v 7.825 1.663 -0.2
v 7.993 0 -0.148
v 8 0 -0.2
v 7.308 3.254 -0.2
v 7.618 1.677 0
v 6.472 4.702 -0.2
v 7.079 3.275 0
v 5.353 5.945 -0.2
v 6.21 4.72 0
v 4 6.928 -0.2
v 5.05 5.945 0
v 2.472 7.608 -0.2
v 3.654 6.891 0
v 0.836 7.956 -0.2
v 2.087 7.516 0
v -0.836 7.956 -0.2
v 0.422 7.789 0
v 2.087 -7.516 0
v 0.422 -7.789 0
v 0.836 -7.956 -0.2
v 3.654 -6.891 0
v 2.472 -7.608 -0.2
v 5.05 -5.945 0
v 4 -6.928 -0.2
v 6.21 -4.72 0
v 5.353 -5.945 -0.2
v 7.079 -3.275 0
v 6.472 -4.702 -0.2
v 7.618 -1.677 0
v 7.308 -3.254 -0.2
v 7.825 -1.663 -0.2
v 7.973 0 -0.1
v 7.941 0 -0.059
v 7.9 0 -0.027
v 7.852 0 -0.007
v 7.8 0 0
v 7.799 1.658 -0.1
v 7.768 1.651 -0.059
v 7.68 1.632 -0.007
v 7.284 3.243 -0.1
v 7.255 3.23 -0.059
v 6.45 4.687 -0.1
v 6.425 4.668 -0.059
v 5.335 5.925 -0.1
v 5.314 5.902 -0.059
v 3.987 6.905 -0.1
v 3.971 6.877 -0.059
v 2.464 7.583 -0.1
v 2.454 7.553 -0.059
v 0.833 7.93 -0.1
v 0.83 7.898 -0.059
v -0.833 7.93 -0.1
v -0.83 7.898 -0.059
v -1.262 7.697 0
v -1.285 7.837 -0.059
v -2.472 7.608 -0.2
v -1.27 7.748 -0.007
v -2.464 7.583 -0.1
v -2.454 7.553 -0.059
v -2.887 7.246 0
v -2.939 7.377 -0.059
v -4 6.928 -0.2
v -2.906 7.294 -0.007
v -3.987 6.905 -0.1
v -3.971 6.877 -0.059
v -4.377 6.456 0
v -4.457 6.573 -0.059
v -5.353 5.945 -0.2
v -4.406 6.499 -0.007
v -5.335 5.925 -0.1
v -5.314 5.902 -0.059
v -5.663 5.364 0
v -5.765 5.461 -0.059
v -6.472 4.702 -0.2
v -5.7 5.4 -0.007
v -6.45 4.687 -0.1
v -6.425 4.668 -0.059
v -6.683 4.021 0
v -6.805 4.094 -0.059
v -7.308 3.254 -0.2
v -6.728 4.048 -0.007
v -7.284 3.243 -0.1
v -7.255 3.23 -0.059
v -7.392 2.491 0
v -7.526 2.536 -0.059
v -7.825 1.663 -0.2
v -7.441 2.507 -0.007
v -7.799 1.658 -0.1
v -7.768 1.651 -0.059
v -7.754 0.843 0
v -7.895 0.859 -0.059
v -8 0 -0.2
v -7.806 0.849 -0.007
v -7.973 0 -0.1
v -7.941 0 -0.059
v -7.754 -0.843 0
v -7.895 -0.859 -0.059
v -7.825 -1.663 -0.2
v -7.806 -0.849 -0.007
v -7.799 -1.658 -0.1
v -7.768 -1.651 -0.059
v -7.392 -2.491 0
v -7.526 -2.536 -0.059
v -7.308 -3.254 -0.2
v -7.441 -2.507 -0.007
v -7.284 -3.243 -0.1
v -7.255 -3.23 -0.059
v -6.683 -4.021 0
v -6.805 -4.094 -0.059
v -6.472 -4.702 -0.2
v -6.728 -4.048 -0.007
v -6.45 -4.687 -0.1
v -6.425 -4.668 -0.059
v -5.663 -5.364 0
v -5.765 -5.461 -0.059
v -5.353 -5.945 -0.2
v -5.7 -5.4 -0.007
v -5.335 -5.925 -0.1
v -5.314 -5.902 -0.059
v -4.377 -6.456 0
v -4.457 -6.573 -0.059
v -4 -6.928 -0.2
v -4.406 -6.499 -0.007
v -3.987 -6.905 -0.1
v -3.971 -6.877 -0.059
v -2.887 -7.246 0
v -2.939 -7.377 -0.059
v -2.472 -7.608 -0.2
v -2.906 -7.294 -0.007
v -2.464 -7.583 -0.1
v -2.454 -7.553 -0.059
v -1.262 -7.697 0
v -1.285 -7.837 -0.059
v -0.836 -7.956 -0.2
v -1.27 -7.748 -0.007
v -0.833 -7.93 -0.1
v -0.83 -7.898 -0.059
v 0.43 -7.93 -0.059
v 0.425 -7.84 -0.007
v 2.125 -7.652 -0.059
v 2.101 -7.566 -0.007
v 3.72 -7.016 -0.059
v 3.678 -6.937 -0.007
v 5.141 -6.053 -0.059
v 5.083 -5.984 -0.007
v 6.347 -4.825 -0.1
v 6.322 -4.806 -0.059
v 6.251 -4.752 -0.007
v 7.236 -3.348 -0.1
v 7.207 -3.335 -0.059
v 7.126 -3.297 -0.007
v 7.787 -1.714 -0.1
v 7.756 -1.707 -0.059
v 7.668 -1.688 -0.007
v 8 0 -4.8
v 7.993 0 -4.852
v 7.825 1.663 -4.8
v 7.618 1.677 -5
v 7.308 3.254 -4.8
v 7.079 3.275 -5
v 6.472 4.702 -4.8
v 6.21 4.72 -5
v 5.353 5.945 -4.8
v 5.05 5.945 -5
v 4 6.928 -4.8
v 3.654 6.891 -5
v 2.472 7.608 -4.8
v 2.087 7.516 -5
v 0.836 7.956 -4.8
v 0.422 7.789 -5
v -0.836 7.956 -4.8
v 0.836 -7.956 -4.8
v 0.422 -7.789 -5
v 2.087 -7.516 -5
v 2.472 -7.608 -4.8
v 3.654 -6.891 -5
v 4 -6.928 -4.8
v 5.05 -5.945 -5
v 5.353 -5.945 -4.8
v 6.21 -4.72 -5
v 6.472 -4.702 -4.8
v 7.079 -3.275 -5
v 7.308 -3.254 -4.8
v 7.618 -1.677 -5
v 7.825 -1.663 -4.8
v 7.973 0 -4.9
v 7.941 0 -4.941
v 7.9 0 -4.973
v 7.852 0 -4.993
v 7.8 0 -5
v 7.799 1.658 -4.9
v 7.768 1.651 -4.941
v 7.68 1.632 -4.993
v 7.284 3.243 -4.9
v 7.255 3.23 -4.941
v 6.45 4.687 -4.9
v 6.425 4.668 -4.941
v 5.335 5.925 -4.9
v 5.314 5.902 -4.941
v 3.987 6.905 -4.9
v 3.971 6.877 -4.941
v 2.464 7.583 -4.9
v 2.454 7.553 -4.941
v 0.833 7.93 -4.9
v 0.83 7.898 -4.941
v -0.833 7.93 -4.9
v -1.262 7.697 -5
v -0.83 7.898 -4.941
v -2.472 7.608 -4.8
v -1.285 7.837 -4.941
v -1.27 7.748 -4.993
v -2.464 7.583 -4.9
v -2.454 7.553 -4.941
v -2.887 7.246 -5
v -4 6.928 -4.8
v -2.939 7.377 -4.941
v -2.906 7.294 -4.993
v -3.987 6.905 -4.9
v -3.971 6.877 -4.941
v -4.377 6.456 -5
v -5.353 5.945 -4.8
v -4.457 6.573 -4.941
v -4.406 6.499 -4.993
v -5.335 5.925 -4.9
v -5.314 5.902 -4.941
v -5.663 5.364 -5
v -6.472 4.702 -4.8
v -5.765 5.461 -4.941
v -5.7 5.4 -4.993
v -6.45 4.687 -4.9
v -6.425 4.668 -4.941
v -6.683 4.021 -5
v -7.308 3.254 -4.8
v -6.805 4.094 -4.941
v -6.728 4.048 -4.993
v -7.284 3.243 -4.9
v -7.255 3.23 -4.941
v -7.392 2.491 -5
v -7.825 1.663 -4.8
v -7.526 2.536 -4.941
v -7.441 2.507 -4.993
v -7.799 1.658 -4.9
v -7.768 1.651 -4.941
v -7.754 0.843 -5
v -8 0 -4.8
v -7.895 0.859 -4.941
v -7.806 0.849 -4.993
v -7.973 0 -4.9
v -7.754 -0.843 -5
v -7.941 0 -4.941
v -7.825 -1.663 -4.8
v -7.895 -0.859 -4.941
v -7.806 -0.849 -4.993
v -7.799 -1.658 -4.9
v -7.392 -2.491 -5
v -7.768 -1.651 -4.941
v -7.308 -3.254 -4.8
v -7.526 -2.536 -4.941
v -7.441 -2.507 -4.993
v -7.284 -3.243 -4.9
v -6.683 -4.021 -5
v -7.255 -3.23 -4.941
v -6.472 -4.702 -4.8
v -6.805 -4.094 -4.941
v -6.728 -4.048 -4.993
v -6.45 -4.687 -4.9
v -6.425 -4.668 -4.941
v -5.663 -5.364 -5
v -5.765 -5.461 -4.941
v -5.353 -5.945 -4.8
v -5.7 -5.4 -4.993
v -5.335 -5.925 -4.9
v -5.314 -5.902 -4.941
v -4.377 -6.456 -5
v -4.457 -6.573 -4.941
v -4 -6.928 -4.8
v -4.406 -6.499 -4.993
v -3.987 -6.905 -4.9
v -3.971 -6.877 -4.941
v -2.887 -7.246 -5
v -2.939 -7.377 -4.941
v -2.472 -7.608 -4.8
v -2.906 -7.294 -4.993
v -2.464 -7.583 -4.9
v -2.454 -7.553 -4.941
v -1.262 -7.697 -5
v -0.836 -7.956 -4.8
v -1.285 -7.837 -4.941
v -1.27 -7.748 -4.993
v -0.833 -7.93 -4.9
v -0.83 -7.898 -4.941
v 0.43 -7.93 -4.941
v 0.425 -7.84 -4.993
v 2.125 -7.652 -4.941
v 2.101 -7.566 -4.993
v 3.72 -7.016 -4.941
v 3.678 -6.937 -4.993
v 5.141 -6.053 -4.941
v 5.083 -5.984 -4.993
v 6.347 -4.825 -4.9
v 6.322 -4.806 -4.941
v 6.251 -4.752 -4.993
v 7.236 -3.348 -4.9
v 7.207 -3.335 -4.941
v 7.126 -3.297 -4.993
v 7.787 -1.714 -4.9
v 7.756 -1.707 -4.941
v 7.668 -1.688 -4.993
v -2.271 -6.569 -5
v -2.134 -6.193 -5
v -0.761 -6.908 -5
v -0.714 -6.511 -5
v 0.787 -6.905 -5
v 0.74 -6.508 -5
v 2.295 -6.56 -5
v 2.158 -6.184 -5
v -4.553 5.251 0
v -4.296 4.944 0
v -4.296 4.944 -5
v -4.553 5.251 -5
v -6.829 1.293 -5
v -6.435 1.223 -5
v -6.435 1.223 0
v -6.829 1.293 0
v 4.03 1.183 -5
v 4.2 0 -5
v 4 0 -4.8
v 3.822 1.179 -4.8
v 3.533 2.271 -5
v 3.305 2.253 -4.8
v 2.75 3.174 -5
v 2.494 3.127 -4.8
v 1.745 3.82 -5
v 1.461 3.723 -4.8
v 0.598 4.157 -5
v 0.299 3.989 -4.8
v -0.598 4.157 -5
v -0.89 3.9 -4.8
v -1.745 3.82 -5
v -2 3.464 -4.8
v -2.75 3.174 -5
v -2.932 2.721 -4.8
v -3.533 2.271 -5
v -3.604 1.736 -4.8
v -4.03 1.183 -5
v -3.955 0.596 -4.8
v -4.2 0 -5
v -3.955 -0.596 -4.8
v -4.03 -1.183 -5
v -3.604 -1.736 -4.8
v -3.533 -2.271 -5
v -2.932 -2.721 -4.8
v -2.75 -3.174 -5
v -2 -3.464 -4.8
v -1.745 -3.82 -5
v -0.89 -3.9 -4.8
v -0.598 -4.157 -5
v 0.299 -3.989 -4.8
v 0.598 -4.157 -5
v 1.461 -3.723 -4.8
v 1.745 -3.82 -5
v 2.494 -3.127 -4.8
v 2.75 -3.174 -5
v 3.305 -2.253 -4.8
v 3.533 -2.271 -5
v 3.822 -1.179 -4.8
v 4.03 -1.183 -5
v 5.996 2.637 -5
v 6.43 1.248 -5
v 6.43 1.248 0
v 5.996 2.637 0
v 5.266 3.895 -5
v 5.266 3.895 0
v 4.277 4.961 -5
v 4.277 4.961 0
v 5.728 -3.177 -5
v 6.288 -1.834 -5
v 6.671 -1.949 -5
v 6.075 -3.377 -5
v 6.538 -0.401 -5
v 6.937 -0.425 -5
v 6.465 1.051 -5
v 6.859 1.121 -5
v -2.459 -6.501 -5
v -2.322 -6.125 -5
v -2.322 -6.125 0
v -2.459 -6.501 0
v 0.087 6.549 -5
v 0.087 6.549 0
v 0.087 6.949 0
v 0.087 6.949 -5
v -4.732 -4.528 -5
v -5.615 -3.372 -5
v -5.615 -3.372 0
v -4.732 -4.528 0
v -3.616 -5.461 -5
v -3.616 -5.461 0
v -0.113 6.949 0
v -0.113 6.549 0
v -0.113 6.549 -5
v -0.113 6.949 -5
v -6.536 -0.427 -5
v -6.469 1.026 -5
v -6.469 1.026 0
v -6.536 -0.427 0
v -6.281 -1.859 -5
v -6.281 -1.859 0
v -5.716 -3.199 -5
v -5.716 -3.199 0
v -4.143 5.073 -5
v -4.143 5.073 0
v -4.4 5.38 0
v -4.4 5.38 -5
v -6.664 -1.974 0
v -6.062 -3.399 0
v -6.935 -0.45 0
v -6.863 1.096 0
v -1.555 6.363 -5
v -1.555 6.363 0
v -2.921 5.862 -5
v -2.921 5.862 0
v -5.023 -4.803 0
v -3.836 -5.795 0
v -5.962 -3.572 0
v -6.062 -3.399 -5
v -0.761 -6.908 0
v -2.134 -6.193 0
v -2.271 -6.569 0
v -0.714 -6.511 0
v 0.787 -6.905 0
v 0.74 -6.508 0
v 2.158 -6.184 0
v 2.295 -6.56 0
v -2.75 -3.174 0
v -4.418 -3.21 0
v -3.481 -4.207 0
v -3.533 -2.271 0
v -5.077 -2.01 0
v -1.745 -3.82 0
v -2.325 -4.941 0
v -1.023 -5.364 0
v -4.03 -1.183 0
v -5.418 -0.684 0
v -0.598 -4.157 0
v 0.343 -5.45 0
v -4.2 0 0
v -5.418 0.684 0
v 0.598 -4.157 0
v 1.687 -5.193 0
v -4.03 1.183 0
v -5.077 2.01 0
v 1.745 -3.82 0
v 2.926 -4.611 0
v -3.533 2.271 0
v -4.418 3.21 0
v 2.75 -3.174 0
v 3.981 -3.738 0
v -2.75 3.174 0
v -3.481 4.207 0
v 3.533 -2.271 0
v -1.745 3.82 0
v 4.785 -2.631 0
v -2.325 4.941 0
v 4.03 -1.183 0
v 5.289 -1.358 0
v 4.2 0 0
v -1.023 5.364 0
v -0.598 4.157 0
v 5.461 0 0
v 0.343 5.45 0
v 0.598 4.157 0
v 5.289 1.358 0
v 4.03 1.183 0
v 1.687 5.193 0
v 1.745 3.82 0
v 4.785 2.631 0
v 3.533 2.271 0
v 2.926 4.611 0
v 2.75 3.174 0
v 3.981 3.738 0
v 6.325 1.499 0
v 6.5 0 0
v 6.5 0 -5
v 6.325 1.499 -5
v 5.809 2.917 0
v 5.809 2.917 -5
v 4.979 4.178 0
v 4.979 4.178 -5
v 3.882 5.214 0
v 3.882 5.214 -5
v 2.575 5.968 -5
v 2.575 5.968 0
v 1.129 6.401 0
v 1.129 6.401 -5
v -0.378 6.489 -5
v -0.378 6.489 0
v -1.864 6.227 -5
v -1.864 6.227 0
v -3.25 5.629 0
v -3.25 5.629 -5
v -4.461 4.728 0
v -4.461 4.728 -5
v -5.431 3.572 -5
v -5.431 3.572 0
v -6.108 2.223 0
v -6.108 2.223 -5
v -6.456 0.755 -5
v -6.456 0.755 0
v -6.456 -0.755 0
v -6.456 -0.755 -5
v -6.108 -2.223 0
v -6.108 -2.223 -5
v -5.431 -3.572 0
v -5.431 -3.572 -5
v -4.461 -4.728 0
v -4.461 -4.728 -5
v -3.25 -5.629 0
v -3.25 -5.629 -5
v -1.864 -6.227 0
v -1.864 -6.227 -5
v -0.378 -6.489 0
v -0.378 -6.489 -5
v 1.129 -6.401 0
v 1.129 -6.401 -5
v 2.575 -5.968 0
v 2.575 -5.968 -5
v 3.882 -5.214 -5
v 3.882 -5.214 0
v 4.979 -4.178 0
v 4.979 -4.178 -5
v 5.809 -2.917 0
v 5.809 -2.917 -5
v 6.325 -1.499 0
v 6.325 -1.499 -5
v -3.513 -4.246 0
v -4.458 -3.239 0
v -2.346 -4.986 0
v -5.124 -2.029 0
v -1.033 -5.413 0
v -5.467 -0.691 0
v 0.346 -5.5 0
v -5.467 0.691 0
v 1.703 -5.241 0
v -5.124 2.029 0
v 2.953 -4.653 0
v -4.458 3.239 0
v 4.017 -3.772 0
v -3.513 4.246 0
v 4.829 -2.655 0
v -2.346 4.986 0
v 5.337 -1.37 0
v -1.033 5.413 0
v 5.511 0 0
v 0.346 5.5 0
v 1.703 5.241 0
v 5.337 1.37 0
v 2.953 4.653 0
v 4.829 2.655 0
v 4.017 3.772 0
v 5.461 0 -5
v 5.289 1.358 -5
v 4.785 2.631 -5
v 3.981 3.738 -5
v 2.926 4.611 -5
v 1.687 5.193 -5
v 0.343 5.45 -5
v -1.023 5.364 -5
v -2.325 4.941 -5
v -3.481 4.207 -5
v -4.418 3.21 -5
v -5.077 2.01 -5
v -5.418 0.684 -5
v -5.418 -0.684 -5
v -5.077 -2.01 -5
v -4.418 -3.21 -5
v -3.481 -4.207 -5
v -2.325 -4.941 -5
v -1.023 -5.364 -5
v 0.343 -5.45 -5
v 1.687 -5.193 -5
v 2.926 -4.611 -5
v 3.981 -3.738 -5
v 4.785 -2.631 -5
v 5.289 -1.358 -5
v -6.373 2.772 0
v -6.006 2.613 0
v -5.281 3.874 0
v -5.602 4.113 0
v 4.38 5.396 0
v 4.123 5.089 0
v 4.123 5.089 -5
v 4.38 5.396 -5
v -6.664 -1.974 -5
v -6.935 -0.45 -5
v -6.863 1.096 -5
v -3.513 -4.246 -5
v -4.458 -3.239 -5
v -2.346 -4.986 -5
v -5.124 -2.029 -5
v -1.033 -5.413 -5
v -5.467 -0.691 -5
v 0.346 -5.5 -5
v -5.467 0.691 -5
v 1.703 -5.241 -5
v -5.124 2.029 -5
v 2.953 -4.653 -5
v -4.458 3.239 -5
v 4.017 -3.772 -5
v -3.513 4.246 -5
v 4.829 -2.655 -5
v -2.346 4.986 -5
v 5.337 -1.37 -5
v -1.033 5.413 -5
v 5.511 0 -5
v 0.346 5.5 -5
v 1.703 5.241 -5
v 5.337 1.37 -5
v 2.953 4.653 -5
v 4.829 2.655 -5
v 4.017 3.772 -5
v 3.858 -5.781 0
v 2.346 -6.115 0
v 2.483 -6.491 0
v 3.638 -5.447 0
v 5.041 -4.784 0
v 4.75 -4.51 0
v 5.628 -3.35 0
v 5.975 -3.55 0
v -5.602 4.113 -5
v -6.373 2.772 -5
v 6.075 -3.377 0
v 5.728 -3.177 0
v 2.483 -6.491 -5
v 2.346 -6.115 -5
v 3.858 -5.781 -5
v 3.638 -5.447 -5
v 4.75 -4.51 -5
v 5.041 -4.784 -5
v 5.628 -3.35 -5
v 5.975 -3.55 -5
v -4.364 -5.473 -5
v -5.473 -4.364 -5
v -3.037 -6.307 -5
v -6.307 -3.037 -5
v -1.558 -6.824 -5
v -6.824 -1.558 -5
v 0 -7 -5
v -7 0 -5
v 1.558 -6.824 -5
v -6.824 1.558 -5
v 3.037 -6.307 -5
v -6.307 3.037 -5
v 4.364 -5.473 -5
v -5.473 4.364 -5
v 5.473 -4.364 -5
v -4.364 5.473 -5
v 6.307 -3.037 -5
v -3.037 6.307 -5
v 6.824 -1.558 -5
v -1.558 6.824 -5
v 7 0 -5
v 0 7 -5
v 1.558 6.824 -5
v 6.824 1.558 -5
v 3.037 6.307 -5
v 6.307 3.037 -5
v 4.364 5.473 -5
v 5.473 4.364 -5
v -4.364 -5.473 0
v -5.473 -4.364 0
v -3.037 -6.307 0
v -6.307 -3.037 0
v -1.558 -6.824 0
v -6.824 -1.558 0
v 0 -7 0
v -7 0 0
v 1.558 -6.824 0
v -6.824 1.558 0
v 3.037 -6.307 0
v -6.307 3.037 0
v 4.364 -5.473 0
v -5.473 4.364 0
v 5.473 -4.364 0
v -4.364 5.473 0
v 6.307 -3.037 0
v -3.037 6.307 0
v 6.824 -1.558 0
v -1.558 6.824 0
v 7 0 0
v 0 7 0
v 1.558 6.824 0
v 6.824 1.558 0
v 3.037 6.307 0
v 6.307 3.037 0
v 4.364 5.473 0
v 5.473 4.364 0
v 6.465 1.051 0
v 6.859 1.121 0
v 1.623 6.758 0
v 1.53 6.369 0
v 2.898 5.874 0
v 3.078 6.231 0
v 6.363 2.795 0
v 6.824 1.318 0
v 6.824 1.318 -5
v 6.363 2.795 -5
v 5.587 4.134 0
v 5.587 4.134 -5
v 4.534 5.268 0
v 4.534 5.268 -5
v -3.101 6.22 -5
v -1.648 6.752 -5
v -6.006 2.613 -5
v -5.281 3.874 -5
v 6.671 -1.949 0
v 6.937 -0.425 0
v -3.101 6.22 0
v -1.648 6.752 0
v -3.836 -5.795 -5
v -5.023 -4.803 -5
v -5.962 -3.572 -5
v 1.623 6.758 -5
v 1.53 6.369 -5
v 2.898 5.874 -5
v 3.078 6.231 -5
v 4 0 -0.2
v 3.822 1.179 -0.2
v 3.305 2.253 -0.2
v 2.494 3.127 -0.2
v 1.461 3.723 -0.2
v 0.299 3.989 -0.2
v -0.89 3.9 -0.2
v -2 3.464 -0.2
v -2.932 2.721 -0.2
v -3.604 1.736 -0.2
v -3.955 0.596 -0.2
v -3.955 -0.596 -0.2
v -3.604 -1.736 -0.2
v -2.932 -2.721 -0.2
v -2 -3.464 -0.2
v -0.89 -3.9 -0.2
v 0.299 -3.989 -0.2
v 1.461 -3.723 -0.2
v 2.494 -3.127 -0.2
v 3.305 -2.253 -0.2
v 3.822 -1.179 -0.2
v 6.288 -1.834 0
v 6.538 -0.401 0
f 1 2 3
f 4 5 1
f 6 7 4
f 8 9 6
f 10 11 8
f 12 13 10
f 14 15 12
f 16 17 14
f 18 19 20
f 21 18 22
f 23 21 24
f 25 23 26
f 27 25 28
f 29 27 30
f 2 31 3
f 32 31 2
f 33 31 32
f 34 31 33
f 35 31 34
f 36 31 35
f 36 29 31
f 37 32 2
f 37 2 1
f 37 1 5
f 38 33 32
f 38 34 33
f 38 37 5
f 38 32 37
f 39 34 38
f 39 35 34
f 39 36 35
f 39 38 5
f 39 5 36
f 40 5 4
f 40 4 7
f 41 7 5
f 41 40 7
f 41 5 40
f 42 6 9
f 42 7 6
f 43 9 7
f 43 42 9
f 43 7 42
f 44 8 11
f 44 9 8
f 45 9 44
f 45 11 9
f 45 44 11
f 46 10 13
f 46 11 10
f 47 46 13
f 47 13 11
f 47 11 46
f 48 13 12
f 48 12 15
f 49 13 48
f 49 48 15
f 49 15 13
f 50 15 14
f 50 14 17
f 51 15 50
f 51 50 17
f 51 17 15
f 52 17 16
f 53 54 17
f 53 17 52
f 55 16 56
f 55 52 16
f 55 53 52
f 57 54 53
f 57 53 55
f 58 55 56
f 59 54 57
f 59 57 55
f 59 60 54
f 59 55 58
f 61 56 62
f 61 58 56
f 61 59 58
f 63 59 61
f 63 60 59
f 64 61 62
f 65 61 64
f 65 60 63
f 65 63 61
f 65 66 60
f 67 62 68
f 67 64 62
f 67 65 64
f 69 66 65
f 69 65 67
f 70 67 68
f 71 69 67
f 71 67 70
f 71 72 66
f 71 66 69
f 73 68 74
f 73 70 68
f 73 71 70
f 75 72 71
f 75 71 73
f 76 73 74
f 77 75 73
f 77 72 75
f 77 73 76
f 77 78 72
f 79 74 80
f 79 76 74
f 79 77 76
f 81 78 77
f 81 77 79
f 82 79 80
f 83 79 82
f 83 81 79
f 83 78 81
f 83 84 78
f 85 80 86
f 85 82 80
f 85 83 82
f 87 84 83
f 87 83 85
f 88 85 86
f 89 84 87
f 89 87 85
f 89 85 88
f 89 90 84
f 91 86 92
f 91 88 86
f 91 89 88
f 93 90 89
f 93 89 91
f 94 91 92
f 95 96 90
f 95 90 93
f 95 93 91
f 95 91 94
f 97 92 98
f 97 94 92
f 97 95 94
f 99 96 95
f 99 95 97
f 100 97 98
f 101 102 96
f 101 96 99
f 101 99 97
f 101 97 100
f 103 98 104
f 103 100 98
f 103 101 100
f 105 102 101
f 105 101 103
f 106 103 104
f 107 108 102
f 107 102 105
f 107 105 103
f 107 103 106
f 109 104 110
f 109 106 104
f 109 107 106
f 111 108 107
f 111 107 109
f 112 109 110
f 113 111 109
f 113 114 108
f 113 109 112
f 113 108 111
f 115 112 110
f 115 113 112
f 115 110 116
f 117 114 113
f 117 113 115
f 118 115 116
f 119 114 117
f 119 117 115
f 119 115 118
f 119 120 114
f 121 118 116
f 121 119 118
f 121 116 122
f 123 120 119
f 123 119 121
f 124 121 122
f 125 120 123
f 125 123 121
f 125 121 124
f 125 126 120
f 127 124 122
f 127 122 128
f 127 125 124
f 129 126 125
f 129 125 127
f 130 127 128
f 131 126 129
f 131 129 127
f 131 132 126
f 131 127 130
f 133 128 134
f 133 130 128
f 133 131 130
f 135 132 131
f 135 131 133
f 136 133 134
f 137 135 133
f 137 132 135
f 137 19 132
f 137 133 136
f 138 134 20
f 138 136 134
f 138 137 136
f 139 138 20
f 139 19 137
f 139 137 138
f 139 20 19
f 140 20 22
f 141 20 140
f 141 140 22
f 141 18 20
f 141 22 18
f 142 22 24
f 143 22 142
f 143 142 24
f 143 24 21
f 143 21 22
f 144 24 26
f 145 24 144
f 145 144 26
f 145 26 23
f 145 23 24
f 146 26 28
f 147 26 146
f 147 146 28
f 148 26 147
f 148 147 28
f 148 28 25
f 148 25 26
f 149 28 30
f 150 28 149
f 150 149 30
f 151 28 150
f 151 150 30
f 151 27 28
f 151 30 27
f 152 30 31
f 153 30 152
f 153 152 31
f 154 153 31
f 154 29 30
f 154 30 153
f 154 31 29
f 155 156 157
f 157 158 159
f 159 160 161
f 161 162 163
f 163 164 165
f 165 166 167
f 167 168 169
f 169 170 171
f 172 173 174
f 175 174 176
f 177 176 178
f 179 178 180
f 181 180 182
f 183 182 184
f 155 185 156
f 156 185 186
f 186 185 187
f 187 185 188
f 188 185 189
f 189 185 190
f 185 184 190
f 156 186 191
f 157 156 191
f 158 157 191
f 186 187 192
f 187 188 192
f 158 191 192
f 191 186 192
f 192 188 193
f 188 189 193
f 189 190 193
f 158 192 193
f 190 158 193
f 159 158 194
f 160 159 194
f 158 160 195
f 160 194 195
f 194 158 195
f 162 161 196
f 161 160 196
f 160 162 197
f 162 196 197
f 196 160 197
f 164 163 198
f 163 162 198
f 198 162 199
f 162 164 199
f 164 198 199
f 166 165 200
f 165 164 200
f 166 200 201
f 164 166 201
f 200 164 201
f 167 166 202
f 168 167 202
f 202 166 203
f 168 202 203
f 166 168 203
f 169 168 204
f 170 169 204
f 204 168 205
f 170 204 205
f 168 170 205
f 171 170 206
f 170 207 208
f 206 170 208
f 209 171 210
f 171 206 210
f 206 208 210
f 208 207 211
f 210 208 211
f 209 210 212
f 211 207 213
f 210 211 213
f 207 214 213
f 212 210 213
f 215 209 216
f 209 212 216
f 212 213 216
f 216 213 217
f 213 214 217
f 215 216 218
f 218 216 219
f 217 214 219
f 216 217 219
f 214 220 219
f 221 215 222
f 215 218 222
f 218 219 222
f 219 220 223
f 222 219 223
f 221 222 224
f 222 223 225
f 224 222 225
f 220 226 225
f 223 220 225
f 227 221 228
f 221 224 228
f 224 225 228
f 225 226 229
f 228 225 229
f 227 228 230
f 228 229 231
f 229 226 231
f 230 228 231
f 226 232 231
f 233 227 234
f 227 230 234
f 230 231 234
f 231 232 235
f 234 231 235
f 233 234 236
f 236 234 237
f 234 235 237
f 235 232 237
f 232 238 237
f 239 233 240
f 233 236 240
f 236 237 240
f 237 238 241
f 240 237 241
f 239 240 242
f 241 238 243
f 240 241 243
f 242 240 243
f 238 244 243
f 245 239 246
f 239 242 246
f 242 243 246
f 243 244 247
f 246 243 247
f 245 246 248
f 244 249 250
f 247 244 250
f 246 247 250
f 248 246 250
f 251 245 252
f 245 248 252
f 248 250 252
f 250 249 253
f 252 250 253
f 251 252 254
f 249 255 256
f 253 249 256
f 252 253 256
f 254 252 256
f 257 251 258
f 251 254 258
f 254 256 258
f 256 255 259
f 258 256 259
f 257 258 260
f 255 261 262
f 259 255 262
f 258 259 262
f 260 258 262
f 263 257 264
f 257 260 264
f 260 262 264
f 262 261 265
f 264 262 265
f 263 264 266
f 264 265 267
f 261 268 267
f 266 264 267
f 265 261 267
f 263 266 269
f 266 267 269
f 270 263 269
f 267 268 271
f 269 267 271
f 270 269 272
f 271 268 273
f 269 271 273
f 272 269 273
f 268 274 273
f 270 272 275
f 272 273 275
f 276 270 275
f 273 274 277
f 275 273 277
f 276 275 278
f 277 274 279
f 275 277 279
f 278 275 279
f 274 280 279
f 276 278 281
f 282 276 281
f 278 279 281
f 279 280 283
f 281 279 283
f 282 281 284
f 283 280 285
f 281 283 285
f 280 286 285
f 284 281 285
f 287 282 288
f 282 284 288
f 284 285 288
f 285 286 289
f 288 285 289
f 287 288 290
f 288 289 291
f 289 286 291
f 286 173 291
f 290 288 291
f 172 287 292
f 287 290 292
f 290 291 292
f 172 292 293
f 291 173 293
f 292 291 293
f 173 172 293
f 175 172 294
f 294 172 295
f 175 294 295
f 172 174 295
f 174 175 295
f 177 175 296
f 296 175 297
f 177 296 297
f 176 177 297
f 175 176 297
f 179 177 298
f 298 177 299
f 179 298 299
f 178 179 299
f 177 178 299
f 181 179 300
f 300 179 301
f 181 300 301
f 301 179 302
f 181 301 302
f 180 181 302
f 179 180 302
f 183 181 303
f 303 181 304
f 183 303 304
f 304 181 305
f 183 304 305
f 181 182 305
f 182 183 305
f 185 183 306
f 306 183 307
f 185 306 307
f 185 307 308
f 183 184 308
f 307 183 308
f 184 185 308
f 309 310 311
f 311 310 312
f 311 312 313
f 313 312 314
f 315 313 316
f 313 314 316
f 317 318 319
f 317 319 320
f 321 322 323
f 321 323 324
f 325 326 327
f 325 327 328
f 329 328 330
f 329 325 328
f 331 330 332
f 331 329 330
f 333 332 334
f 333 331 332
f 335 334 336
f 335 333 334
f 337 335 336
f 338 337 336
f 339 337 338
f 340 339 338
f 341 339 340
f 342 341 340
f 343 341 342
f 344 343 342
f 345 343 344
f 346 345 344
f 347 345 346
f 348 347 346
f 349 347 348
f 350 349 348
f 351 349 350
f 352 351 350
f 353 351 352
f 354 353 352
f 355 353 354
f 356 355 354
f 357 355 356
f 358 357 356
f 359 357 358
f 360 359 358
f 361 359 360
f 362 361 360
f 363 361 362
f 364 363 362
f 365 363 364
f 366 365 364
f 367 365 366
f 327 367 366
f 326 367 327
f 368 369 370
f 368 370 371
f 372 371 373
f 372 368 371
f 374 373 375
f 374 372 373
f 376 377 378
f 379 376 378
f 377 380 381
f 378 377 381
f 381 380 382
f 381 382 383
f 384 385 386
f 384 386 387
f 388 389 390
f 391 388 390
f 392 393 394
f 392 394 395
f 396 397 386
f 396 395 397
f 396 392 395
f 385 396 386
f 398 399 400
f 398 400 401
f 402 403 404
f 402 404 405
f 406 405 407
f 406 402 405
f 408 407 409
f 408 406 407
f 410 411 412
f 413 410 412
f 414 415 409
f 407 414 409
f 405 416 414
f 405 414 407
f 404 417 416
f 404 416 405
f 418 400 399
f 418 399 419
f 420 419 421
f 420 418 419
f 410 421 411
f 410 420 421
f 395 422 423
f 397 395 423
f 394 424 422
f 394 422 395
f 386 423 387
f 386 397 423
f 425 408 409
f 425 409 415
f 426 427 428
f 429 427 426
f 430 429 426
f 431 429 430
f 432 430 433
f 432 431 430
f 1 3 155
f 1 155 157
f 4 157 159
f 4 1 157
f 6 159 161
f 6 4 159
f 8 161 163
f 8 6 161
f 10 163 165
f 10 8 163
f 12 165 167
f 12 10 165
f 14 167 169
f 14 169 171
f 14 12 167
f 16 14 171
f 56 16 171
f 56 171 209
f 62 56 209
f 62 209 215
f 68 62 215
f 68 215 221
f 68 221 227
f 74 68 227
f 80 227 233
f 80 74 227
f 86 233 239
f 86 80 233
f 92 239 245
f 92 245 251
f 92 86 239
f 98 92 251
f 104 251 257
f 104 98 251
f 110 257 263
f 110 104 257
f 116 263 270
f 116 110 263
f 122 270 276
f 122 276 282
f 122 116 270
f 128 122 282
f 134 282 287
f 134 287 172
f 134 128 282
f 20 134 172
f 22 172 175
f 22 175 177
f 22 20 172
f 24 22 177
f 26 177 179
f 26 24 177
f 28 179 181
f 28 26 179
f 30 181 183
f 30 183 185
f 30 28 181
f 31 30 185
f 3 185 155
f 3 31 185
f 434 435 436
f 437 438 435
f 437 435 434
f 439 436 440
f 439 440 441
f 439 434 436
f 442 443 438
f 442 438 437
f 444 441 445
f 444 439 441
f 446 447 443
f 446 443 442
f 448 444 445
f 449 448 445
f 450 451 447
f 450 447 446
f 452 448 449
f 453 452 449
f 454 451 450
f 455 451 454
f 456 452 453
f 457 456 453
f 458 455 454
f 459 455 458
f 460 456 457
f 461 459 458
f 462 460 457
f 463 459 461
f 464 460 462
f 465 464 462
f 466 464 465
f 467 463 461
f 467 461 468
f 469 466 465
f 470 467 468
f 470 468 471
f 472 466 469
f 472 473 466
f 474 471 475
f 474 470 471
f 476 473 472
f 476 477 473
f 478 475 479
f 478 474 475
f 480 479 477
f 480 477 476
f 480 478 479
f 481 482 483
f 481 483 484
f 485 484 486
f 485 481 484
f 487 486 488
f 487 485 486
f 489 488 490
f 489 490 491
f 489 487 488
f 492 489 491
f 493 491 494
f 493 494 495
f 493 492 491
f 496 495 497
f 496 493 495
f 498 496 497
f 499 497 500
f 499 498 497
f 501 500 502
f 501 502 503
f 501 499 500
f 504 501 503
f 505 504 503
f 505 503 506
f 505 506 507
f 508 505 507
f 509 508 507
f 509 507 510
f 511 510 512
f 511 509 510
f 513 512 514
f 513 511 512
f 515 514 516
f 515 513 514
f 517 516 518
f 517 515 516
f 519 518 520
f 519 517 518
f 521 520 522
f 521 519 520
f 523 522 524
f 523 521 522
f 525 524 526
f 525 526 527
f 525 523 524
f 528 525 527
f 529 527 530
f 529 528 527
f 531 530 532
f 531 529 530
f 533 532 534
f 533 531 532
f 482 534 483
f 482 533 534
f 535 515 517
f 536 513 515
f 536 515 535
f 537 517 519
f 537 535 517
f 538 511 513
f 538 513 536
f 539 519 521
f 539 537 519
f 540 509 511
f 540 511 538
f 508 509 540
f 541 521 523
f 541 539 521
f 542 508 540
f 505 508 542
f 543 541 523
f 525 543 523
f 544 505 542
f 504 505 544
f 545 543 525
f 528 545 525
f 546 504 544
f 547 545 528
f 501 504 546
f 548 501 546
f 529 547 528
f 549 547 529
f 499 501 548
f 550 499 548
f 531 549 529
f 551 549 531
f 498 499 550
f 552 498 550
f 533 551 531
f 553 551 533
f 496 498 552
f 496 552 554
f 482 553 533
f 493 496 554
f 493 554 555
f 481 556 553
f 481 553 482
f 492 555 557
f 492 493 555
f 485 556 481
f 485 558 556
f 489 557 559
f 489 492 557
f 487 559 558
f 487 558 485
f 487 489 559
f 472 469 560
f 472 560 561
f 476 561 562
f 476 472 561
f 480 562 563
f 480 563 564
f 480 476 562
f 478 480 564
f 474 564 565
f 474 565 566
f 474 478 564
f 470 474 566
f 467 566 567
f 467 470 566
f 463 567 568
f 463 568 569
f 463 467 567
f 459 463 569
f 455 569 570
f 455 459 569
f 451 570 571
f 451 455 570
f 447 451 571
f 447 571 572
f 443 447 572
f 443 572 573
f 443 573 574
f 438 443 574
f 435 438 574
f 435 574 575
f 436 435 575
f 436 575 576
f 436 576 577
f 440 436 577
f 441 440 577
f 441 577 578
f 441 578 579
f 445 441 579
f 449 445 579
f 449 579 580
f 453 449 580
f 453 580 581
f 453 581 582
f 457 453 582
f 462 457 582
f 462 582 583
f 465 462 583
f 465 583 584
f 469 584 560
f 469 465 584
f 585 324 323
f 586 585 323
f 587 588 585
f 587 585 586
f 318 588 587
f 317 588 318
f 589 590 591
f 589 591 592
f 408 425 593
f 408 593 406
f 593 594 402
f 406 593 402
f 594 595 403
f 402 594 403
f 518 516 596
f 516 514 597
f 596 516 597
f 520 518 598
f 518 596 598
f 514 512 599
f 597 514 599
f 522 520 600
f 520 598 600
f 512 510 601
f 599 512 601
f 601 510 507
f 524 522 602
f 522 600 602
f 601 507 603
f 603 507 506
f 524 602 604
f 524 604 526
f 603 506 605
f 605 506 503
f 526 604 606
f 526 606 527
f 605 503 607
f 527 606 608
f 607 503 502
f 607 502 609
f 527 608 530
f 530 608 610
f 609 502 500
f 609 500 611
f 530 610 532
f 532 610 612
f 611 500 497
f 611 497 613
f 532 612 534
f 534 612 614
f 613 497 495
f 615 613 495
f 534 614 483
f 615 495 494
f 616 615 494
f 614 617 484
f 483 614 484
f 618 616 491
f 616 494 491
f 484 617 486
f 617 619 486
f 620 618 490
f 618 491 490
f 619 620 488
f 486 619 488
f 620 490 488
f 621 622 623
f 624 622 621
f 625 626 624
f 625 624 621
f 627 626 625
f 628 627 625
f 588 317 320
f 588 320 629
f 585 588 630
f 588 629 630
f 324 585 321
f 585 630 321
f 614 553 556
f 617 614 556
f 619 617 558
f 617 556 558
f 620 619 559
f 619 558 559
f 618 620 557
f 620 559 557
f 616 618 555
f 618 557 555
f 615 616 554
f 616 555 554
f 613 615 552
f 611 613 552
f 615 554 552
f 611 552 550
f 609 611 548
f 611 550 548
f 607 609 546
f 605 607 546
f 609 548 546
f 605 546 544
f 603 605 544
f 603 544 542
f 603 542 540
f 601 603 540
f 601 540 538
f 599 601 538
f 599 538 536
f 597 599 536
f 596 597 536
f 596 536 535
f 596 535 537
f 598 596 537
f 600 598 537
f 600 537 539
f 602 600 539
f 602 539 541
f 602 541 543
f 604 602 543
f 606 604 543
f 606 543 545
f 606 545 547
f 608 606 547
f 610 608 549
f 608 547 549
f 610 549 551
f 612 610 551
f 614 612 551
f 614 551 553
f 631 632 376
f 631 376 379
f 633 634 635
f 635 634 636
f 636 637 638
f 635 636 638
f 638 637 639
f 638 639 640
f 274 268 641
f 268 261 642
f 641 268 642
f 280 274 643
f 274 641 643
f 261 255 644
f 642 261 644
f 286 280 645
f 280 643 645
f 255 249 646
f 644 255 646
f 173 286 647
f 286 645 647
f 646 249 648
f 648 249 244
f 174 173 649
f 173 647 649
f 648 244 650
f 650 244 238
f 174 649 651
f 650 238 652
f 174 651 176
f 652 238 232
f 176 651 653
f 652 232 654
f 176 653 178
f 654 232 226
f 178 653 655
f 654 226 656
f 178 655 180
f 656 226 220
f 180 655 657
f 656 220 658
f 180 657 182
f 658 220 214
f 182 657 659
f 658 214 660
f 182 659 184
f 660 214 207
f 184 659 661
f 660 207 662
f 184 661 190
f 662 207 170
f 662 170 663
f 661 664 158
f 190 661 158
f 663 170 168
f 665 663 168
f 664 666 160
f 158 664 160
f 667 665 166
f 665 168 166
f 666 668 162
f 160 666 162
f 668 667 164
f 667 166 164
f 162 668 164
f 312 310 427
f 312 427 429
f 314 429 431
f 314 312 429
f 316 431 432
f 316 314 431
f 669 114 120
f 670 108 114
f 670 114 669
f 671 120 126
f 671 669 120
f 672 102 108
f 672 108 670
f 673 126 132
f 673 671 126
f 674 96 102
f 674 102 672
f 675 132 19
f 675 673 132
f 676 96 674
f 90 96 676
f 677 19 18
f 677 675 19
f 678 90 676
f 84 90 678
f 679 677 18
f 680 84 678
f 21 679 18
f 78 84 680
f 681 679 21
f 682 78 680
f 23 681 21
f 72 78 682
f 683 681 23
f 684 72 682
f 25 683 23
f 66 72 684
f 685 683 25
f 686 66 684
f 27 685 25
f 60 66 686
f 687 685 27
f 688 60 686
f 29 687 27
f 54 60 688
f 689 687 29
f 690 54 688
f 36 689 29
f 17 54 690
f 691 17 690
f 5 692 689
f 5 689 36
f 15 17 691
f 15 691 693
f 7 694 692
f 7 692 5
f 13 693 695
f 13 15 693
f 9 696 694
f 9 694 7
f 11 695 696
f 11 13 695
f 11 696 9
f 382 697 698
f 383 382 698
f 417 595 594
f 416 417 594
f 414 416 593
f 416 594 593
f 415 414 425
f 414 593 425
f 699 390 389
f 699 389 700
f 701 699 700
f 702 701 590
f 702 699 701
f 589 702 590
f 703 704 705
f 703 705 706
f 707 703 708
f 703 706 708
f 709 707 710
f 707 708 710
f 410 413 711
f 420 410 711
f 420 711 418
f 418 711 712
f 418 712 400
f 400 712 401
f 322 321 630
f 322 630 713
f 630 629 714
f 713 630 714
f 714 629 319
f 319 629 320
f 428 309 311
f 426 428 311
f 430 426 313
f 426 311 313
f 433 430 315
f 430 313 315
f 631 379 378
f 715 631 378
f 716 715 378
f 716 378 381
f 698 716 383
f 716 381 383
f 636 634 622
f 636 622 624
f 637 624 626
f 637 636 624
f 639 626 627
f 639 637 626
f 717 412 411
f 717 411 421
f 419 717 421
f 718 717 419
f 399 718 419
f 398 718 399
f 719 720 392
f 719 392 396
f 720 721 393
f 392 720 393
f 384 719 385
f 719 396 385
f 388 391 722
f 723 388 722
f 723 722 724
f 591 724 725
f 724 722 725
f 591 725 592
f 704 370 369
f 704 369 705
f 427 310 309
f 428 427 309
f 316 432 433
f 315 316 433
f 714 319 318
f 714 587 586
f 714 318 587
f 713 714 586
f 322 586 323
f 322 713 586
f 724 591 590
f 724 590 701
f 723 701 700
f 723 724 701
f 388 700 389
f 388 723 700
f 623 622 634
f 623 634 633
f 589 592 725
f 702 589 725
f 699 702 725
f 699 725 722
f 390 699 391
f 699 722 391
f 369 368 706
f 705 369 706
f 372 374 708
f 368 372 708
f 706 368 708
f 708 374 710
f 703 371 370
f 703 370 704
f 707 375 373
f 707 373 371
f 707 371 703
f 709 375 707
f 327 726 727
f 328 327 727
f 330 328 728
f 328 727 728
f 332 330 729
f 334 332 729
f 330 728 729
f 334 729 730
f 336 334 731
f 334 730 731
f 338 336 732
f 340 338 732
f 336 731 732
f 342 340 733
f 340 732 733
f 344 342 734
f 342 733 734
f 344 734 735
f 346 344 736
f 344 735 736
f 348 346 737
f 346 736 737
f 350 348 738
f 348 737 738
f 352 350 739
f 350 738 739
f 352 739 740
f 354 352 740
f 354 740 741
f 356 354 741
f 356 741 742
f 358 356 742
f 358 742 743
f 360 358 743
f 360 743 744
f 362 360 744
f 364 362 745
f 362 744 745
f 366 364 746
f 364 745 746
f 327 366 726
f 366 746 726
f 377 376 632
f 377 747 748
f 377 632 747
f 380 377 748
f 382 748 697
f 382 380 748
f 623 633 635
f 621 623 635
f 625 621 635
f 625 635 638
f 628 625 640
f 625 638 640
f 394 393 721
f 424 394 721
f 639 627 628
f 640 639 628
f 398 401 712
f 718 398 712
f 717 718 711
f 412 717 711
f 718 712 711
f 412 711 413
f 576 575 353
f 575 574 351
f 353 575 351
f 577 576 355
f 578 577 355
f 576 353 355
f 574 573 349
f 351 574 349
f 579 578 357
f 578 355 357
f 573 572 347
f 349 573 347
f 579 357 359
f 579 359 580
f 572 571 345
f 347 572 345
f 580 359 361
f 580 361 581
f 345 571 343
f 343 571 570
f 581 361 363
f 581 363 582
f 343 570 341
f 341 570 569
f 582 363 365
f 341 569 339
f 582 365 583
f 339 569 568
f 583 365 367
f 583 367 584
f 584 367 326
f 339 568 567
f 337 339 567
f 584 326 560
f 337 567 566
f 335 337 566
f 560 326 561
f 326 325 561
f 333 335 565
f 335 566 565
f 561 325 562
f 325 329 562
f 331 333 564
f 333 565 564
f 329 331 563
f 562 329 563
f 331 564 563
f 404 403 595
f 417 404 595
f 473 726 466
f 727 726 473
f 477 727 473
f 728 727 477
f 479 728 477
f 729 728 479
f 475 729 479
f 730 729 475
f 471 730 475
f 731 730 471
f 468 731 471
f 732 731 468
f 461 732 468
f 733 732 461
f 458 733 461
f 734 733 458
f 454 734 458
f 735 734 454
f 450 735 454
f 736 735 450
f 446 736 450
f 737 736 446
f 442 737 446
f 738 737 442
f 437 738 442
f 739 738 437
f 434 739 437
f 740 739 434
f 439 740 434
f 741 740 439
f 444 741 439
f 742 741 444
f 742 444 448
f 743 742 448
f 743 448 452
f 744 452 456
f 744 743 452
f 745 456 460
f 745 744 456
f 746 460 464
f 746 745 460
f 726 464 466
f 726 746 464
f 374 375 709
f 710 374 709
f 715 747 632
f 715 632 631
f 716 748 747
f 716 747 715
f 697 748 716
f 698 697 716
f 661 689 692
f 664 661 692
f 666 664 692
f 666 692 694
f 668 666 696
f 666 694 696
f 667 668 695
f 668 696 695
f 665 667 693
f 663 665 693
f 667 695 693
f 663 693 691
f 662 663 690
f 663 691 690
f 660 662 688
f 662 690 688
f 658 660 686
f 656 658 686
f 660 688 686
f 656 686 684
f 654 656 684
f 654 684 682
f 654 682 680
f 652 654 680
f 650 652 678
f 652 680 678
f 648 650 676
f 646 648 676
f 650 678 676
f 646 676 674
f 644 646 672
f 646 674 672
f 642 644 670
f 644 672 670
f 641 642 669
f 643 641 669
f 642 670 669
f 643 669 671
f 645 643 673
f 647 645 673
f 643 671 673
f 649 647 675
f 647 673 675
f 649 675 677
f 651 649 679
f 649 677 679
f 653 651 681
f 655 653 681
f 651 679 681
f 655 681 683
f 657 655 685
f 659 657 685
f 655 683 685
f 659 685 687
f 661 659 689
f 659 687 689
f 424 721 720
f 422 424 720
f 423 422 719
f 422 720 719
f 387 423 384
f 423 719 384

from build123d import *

# Parameters (mm, degrees)
SKETCH1_R                = 8
BOSS_EXTRUDE1_DEPTH      = 5
SKETCH1_3_R              = 4
CUT_EXTRUDE1_DEPTH       = 5
SKETCH1_4_R              = 7
CUT_EXTRUDE2_DEPTH       = 5
SKETCH1_5_R              = 6.5
BOSS_EXTRUDE2_DEPTH      = 5
SKETCH1_6_R              = 4
CUT_EXTRUDE3_DEPTH       = 5
SKETCH3_R                = 7
SKETCH3_R_2              = 6.5
BOSS_EXTRUDE3_DEPTH      = 5
MOVE_START               = -5
MOVE_FACE1_OUTLINE_R     = 7
MOVE_FACE1_OUTLINE_R_2   = 6.95
MOVE_FACE1_OUTLINE_R_3   = 6.55
MOVE_FACE1_OUTLINE_R_4   = 6.5
MOVE_FACE1_DEPTH         = 5
BOSS_EXTRUDE4_DEPTH      = 1
BOSS_EXTRUDE4_DEPTH_BACK = 6
SKETCH4_W                = 0.2
SKETCH4_H                = 2.390737137
CIRPATTERN1_COUNT        = 9
SKETCH5_R                = 5.51056118
SKETCH5_R_2              = 5.46056118
CUT_EXTRUDE4_DEPTH       = 6
FILLET1_R                = 0.2
CHAMFER1_SIZE            = 0.2


# Read off the part's stored shape, not the designer's step: Move Face1
with BuildPart() as part:
    # Sketch1 → Boss-Extrude1 (new body)
    with BuildSketch(Plane.XY):
        Circle(SKETCH1_R)
    extrude(amount=-BOSS_EXTRUDE1_DEPTH)

    # Sketch1<3> → Cut-Extrude1 (cut)
    with BuildSketch(Plane.XY):
        Circle(SKETCH1_3_R)
    extrude(amount=-CUT_EXTRUDE1_DEPTH, mode=Mode.SUBTRACT)

    # Sketch1<4> → Cut-Extrude2 (cut)
    with BuildSketch(Plane.XY):
        Circle(SKETCH1_4_R)
    extrude(amount=-CUT_EXTRUDE2_DEPTH, mode=Mode.SUBTRACT)

    # Fillet1
    fillet1_edges = [part.edges().sort_by_distance(p)[0] for p in [
        (-8, 0, 0),
        (-8, 0, -5),
    ]]
    fillet(fillet1_edges, radius=FILLET1_R)


with BuildPart() as body_2:
    # Sketch1<5> → Boss-Extrude2 (new body)
    with BuildSketch(Plane.XY):
        Circle(SKETCH1_5_R)
    extrude(amount=-BOSS_EXTRUDE2_DEPTH)

    # Sketch1<6> → Cut-Extrude3 (cut)
    with BuildSketch(Plane.XY):
        Circle(SKETCH1_6_R)
    extrude(amount=-CUT_EXTRUDE3_DEPTH, mode=Mode.SUBTRACT)

    # Sketch5 → Cut-Extrude4 (cut)
    with BuildSketch(Plane.XY):
        Circle(SKETCH5_R)
        Circle(SKETCH5_R_2, mode=Mode.SUBTRACT)
    extrude(amount=-CUT_EXTRUDE4_DEPTH, mode=Mode.SUBTRACT)


with BuildPart() as body_3:
    # Sketch3 → Boss-Extrude3 (new body)
    with BuildSketch(Plane.XY):
        Circle(SKETCH3_R)
        Circle(SKETCH3_R_2, mode=Mode.SUBTRACT)
    extrude(amount=-BOSS_EXTRUDE3_DEPTH)

    # Move Face1 outline → Move Face1 (cut)
    # profile 1 of 2: a face of its own
    with BuildSketch(Plane.XY.offset(MOVE_START)):
        Circle(MOVE_FACE1_OUTLINE_R)
        Circle(MOVE_FACE1_OUTLINE_R_2, mode=Mode.SUBTRACT)
    # profile 2 of 2: a face of its own
    with BuildSketch(Plane.XY.offset(MOVE_START)):
        Circle(MOVE_FACE1_OUTLINE_R_3)
        Circle(MOVE_FACE1_OUTLINE_R_4, mode=Mode.SUBTRACT)
    extrude(amount=MOVE_FACE1_DEPTH, mode=Mode.SUBTRACT)


with BuildPart() as body_4:
    # Sketch4 → Boss-Extrude4 (new, two sides: drawn at the far end of the back side and taken through both)
    with BuildSketch(Plane(origin=(0, 0, -5), x_dir=(-1, 0, 0), z_dir=(0, 0, -1)).offset(-BOSS_EXTRUDE4_DEPTH_BACK)):
        with Locations((0.01287322, 6.333584267)):
            Rectangle(SKETCH4_W, SKETCH4_H)
    extrude(amount=BOSS_EXTRUDE4_DEPTH + BOSS_EXTRUDE4_DEPTH_BACK)


with BuildPart() as cirpattern1_1:
    # CirPattern1: pattern copy
    add(body_4.part.rotate(Axis((0, 0, 0), (0, 0, 1)), 1 * 360 / CIRPATTERN1_COUNT))


with BuildPart() as cirpattern1_2:
    # CirPattern1: pattern copy
    add(body_4.part.rotate(Axis((0, 0, 0), (0, 0, 1)), 2 * 360 / CIRPATTERN1_COUNT))


with BuildPart() as cirpattern1_3:
    # CirPattern1: pattern copy
    add(body_4.part.rotate(Axis((0, 0, 0), (0, 0, 1)), 3 * 360 / CIRPATTERN1_COUNT))


with BuildPart() as cirpattern1_4:
    # CirPattern1: pattern copy
    add(body_4.part.rotate(Axis((0, 0, 0), (0, 0, 1)), 4 * 360 / CIRPATTERN1_COUNT))


with BuildPart() as cirpattern1_5:
    # CirPattern1: pattern copy
    add(body_4.part.rotate(Axis((0, 0, 0), (0, 0, 1)), 5 * 360 / CIRPATTERN1_COUNT))


with BuildPart() as cirpattern1_6:
    # CirPattern1: pattern copy
    add(body_4.part.rotate(Axis((0, 0, 0), (0, 0, 1)), 6 * 360 / CIRPATTERN1_COUNT))


with BuildPart() as cirpattern1_7:
    # CirPattern1: pattern copy
    add(body_4.part.rotate(Axis((0, 0, 0), (0, 0, 1)), 7 * 360 / CIRPATTERN1_COUNT))


with BuildPart() as cirpattern1_8:
    # CirPattern1: pattern copy
    add(body_4.part.rotate(Axis((0, 0, 0), (0, 0, 1)), 8 * 360 / CIRPATTERN1_COUNT))


with BuildPart() as body_3_1:
    add(body_3.part)

    # Combine1: cut body 4, CirPattern1_1, CirPattern1_2, CirPattern1_3, CirPattern1_4, CirPattern1_5, CirPattern1_6, CirPattern1_7, CirPattern1_8
    add(body_4.part, mode=Mode.SUBTRACT)
    add(cirpattern1_1.part, mode=Mode.SUBTRACT)
    add(cirpattern1_2.part, mode=Mode.SUBTRACT)
    add(cirpattern1_3.part, mode=Mode.SUBTRACT)
    add(cirpattern1_4.part, mode=Mode.SUBTRACT)
    add(cirpattern1_5.part, mode=Mode.SUBTRACT)
    add(cirpattern1_6.part, mode=Mode.SUBTRACT)
    add(cirpattern1_7.part, mode=Mode.SUBTRACT)
    add(cirpattern1_8.part, mode=Mode.SUBTRACT)


with BuildPart() as cut_extrude4_piece_1:
    # of the separate pieces the step leaves, piece 1, a body of its own (cut_extrude4_pieces)
    add(body_2.part.solids().sort_by_distance((5.46056118, 0, 0))[0])

    # Chamfer1
    chamfer1_edges = [cut_extrude4_piece_1.edges().sort_by_distance(p)[0] for p in [
        (-4, 0, -5),
        (-4, 0, 0),
    ]]
    chamfer(chamfer1_edges, length=CHAMFER1_SIZE)


with BuildPart() as cut_extrude4_piece_2:
    # of the separate pieces the step leaves, piece 2, a body of its own (cut_extrude4_pieces)
    add(body_2.part.solids().sort_by_distance((6.5, 0, 0))[0])


solid = Compound([part.part, body_3_1.part, cut_extrude4_piece_1.part, cut_extrude4_piece_2.part])
